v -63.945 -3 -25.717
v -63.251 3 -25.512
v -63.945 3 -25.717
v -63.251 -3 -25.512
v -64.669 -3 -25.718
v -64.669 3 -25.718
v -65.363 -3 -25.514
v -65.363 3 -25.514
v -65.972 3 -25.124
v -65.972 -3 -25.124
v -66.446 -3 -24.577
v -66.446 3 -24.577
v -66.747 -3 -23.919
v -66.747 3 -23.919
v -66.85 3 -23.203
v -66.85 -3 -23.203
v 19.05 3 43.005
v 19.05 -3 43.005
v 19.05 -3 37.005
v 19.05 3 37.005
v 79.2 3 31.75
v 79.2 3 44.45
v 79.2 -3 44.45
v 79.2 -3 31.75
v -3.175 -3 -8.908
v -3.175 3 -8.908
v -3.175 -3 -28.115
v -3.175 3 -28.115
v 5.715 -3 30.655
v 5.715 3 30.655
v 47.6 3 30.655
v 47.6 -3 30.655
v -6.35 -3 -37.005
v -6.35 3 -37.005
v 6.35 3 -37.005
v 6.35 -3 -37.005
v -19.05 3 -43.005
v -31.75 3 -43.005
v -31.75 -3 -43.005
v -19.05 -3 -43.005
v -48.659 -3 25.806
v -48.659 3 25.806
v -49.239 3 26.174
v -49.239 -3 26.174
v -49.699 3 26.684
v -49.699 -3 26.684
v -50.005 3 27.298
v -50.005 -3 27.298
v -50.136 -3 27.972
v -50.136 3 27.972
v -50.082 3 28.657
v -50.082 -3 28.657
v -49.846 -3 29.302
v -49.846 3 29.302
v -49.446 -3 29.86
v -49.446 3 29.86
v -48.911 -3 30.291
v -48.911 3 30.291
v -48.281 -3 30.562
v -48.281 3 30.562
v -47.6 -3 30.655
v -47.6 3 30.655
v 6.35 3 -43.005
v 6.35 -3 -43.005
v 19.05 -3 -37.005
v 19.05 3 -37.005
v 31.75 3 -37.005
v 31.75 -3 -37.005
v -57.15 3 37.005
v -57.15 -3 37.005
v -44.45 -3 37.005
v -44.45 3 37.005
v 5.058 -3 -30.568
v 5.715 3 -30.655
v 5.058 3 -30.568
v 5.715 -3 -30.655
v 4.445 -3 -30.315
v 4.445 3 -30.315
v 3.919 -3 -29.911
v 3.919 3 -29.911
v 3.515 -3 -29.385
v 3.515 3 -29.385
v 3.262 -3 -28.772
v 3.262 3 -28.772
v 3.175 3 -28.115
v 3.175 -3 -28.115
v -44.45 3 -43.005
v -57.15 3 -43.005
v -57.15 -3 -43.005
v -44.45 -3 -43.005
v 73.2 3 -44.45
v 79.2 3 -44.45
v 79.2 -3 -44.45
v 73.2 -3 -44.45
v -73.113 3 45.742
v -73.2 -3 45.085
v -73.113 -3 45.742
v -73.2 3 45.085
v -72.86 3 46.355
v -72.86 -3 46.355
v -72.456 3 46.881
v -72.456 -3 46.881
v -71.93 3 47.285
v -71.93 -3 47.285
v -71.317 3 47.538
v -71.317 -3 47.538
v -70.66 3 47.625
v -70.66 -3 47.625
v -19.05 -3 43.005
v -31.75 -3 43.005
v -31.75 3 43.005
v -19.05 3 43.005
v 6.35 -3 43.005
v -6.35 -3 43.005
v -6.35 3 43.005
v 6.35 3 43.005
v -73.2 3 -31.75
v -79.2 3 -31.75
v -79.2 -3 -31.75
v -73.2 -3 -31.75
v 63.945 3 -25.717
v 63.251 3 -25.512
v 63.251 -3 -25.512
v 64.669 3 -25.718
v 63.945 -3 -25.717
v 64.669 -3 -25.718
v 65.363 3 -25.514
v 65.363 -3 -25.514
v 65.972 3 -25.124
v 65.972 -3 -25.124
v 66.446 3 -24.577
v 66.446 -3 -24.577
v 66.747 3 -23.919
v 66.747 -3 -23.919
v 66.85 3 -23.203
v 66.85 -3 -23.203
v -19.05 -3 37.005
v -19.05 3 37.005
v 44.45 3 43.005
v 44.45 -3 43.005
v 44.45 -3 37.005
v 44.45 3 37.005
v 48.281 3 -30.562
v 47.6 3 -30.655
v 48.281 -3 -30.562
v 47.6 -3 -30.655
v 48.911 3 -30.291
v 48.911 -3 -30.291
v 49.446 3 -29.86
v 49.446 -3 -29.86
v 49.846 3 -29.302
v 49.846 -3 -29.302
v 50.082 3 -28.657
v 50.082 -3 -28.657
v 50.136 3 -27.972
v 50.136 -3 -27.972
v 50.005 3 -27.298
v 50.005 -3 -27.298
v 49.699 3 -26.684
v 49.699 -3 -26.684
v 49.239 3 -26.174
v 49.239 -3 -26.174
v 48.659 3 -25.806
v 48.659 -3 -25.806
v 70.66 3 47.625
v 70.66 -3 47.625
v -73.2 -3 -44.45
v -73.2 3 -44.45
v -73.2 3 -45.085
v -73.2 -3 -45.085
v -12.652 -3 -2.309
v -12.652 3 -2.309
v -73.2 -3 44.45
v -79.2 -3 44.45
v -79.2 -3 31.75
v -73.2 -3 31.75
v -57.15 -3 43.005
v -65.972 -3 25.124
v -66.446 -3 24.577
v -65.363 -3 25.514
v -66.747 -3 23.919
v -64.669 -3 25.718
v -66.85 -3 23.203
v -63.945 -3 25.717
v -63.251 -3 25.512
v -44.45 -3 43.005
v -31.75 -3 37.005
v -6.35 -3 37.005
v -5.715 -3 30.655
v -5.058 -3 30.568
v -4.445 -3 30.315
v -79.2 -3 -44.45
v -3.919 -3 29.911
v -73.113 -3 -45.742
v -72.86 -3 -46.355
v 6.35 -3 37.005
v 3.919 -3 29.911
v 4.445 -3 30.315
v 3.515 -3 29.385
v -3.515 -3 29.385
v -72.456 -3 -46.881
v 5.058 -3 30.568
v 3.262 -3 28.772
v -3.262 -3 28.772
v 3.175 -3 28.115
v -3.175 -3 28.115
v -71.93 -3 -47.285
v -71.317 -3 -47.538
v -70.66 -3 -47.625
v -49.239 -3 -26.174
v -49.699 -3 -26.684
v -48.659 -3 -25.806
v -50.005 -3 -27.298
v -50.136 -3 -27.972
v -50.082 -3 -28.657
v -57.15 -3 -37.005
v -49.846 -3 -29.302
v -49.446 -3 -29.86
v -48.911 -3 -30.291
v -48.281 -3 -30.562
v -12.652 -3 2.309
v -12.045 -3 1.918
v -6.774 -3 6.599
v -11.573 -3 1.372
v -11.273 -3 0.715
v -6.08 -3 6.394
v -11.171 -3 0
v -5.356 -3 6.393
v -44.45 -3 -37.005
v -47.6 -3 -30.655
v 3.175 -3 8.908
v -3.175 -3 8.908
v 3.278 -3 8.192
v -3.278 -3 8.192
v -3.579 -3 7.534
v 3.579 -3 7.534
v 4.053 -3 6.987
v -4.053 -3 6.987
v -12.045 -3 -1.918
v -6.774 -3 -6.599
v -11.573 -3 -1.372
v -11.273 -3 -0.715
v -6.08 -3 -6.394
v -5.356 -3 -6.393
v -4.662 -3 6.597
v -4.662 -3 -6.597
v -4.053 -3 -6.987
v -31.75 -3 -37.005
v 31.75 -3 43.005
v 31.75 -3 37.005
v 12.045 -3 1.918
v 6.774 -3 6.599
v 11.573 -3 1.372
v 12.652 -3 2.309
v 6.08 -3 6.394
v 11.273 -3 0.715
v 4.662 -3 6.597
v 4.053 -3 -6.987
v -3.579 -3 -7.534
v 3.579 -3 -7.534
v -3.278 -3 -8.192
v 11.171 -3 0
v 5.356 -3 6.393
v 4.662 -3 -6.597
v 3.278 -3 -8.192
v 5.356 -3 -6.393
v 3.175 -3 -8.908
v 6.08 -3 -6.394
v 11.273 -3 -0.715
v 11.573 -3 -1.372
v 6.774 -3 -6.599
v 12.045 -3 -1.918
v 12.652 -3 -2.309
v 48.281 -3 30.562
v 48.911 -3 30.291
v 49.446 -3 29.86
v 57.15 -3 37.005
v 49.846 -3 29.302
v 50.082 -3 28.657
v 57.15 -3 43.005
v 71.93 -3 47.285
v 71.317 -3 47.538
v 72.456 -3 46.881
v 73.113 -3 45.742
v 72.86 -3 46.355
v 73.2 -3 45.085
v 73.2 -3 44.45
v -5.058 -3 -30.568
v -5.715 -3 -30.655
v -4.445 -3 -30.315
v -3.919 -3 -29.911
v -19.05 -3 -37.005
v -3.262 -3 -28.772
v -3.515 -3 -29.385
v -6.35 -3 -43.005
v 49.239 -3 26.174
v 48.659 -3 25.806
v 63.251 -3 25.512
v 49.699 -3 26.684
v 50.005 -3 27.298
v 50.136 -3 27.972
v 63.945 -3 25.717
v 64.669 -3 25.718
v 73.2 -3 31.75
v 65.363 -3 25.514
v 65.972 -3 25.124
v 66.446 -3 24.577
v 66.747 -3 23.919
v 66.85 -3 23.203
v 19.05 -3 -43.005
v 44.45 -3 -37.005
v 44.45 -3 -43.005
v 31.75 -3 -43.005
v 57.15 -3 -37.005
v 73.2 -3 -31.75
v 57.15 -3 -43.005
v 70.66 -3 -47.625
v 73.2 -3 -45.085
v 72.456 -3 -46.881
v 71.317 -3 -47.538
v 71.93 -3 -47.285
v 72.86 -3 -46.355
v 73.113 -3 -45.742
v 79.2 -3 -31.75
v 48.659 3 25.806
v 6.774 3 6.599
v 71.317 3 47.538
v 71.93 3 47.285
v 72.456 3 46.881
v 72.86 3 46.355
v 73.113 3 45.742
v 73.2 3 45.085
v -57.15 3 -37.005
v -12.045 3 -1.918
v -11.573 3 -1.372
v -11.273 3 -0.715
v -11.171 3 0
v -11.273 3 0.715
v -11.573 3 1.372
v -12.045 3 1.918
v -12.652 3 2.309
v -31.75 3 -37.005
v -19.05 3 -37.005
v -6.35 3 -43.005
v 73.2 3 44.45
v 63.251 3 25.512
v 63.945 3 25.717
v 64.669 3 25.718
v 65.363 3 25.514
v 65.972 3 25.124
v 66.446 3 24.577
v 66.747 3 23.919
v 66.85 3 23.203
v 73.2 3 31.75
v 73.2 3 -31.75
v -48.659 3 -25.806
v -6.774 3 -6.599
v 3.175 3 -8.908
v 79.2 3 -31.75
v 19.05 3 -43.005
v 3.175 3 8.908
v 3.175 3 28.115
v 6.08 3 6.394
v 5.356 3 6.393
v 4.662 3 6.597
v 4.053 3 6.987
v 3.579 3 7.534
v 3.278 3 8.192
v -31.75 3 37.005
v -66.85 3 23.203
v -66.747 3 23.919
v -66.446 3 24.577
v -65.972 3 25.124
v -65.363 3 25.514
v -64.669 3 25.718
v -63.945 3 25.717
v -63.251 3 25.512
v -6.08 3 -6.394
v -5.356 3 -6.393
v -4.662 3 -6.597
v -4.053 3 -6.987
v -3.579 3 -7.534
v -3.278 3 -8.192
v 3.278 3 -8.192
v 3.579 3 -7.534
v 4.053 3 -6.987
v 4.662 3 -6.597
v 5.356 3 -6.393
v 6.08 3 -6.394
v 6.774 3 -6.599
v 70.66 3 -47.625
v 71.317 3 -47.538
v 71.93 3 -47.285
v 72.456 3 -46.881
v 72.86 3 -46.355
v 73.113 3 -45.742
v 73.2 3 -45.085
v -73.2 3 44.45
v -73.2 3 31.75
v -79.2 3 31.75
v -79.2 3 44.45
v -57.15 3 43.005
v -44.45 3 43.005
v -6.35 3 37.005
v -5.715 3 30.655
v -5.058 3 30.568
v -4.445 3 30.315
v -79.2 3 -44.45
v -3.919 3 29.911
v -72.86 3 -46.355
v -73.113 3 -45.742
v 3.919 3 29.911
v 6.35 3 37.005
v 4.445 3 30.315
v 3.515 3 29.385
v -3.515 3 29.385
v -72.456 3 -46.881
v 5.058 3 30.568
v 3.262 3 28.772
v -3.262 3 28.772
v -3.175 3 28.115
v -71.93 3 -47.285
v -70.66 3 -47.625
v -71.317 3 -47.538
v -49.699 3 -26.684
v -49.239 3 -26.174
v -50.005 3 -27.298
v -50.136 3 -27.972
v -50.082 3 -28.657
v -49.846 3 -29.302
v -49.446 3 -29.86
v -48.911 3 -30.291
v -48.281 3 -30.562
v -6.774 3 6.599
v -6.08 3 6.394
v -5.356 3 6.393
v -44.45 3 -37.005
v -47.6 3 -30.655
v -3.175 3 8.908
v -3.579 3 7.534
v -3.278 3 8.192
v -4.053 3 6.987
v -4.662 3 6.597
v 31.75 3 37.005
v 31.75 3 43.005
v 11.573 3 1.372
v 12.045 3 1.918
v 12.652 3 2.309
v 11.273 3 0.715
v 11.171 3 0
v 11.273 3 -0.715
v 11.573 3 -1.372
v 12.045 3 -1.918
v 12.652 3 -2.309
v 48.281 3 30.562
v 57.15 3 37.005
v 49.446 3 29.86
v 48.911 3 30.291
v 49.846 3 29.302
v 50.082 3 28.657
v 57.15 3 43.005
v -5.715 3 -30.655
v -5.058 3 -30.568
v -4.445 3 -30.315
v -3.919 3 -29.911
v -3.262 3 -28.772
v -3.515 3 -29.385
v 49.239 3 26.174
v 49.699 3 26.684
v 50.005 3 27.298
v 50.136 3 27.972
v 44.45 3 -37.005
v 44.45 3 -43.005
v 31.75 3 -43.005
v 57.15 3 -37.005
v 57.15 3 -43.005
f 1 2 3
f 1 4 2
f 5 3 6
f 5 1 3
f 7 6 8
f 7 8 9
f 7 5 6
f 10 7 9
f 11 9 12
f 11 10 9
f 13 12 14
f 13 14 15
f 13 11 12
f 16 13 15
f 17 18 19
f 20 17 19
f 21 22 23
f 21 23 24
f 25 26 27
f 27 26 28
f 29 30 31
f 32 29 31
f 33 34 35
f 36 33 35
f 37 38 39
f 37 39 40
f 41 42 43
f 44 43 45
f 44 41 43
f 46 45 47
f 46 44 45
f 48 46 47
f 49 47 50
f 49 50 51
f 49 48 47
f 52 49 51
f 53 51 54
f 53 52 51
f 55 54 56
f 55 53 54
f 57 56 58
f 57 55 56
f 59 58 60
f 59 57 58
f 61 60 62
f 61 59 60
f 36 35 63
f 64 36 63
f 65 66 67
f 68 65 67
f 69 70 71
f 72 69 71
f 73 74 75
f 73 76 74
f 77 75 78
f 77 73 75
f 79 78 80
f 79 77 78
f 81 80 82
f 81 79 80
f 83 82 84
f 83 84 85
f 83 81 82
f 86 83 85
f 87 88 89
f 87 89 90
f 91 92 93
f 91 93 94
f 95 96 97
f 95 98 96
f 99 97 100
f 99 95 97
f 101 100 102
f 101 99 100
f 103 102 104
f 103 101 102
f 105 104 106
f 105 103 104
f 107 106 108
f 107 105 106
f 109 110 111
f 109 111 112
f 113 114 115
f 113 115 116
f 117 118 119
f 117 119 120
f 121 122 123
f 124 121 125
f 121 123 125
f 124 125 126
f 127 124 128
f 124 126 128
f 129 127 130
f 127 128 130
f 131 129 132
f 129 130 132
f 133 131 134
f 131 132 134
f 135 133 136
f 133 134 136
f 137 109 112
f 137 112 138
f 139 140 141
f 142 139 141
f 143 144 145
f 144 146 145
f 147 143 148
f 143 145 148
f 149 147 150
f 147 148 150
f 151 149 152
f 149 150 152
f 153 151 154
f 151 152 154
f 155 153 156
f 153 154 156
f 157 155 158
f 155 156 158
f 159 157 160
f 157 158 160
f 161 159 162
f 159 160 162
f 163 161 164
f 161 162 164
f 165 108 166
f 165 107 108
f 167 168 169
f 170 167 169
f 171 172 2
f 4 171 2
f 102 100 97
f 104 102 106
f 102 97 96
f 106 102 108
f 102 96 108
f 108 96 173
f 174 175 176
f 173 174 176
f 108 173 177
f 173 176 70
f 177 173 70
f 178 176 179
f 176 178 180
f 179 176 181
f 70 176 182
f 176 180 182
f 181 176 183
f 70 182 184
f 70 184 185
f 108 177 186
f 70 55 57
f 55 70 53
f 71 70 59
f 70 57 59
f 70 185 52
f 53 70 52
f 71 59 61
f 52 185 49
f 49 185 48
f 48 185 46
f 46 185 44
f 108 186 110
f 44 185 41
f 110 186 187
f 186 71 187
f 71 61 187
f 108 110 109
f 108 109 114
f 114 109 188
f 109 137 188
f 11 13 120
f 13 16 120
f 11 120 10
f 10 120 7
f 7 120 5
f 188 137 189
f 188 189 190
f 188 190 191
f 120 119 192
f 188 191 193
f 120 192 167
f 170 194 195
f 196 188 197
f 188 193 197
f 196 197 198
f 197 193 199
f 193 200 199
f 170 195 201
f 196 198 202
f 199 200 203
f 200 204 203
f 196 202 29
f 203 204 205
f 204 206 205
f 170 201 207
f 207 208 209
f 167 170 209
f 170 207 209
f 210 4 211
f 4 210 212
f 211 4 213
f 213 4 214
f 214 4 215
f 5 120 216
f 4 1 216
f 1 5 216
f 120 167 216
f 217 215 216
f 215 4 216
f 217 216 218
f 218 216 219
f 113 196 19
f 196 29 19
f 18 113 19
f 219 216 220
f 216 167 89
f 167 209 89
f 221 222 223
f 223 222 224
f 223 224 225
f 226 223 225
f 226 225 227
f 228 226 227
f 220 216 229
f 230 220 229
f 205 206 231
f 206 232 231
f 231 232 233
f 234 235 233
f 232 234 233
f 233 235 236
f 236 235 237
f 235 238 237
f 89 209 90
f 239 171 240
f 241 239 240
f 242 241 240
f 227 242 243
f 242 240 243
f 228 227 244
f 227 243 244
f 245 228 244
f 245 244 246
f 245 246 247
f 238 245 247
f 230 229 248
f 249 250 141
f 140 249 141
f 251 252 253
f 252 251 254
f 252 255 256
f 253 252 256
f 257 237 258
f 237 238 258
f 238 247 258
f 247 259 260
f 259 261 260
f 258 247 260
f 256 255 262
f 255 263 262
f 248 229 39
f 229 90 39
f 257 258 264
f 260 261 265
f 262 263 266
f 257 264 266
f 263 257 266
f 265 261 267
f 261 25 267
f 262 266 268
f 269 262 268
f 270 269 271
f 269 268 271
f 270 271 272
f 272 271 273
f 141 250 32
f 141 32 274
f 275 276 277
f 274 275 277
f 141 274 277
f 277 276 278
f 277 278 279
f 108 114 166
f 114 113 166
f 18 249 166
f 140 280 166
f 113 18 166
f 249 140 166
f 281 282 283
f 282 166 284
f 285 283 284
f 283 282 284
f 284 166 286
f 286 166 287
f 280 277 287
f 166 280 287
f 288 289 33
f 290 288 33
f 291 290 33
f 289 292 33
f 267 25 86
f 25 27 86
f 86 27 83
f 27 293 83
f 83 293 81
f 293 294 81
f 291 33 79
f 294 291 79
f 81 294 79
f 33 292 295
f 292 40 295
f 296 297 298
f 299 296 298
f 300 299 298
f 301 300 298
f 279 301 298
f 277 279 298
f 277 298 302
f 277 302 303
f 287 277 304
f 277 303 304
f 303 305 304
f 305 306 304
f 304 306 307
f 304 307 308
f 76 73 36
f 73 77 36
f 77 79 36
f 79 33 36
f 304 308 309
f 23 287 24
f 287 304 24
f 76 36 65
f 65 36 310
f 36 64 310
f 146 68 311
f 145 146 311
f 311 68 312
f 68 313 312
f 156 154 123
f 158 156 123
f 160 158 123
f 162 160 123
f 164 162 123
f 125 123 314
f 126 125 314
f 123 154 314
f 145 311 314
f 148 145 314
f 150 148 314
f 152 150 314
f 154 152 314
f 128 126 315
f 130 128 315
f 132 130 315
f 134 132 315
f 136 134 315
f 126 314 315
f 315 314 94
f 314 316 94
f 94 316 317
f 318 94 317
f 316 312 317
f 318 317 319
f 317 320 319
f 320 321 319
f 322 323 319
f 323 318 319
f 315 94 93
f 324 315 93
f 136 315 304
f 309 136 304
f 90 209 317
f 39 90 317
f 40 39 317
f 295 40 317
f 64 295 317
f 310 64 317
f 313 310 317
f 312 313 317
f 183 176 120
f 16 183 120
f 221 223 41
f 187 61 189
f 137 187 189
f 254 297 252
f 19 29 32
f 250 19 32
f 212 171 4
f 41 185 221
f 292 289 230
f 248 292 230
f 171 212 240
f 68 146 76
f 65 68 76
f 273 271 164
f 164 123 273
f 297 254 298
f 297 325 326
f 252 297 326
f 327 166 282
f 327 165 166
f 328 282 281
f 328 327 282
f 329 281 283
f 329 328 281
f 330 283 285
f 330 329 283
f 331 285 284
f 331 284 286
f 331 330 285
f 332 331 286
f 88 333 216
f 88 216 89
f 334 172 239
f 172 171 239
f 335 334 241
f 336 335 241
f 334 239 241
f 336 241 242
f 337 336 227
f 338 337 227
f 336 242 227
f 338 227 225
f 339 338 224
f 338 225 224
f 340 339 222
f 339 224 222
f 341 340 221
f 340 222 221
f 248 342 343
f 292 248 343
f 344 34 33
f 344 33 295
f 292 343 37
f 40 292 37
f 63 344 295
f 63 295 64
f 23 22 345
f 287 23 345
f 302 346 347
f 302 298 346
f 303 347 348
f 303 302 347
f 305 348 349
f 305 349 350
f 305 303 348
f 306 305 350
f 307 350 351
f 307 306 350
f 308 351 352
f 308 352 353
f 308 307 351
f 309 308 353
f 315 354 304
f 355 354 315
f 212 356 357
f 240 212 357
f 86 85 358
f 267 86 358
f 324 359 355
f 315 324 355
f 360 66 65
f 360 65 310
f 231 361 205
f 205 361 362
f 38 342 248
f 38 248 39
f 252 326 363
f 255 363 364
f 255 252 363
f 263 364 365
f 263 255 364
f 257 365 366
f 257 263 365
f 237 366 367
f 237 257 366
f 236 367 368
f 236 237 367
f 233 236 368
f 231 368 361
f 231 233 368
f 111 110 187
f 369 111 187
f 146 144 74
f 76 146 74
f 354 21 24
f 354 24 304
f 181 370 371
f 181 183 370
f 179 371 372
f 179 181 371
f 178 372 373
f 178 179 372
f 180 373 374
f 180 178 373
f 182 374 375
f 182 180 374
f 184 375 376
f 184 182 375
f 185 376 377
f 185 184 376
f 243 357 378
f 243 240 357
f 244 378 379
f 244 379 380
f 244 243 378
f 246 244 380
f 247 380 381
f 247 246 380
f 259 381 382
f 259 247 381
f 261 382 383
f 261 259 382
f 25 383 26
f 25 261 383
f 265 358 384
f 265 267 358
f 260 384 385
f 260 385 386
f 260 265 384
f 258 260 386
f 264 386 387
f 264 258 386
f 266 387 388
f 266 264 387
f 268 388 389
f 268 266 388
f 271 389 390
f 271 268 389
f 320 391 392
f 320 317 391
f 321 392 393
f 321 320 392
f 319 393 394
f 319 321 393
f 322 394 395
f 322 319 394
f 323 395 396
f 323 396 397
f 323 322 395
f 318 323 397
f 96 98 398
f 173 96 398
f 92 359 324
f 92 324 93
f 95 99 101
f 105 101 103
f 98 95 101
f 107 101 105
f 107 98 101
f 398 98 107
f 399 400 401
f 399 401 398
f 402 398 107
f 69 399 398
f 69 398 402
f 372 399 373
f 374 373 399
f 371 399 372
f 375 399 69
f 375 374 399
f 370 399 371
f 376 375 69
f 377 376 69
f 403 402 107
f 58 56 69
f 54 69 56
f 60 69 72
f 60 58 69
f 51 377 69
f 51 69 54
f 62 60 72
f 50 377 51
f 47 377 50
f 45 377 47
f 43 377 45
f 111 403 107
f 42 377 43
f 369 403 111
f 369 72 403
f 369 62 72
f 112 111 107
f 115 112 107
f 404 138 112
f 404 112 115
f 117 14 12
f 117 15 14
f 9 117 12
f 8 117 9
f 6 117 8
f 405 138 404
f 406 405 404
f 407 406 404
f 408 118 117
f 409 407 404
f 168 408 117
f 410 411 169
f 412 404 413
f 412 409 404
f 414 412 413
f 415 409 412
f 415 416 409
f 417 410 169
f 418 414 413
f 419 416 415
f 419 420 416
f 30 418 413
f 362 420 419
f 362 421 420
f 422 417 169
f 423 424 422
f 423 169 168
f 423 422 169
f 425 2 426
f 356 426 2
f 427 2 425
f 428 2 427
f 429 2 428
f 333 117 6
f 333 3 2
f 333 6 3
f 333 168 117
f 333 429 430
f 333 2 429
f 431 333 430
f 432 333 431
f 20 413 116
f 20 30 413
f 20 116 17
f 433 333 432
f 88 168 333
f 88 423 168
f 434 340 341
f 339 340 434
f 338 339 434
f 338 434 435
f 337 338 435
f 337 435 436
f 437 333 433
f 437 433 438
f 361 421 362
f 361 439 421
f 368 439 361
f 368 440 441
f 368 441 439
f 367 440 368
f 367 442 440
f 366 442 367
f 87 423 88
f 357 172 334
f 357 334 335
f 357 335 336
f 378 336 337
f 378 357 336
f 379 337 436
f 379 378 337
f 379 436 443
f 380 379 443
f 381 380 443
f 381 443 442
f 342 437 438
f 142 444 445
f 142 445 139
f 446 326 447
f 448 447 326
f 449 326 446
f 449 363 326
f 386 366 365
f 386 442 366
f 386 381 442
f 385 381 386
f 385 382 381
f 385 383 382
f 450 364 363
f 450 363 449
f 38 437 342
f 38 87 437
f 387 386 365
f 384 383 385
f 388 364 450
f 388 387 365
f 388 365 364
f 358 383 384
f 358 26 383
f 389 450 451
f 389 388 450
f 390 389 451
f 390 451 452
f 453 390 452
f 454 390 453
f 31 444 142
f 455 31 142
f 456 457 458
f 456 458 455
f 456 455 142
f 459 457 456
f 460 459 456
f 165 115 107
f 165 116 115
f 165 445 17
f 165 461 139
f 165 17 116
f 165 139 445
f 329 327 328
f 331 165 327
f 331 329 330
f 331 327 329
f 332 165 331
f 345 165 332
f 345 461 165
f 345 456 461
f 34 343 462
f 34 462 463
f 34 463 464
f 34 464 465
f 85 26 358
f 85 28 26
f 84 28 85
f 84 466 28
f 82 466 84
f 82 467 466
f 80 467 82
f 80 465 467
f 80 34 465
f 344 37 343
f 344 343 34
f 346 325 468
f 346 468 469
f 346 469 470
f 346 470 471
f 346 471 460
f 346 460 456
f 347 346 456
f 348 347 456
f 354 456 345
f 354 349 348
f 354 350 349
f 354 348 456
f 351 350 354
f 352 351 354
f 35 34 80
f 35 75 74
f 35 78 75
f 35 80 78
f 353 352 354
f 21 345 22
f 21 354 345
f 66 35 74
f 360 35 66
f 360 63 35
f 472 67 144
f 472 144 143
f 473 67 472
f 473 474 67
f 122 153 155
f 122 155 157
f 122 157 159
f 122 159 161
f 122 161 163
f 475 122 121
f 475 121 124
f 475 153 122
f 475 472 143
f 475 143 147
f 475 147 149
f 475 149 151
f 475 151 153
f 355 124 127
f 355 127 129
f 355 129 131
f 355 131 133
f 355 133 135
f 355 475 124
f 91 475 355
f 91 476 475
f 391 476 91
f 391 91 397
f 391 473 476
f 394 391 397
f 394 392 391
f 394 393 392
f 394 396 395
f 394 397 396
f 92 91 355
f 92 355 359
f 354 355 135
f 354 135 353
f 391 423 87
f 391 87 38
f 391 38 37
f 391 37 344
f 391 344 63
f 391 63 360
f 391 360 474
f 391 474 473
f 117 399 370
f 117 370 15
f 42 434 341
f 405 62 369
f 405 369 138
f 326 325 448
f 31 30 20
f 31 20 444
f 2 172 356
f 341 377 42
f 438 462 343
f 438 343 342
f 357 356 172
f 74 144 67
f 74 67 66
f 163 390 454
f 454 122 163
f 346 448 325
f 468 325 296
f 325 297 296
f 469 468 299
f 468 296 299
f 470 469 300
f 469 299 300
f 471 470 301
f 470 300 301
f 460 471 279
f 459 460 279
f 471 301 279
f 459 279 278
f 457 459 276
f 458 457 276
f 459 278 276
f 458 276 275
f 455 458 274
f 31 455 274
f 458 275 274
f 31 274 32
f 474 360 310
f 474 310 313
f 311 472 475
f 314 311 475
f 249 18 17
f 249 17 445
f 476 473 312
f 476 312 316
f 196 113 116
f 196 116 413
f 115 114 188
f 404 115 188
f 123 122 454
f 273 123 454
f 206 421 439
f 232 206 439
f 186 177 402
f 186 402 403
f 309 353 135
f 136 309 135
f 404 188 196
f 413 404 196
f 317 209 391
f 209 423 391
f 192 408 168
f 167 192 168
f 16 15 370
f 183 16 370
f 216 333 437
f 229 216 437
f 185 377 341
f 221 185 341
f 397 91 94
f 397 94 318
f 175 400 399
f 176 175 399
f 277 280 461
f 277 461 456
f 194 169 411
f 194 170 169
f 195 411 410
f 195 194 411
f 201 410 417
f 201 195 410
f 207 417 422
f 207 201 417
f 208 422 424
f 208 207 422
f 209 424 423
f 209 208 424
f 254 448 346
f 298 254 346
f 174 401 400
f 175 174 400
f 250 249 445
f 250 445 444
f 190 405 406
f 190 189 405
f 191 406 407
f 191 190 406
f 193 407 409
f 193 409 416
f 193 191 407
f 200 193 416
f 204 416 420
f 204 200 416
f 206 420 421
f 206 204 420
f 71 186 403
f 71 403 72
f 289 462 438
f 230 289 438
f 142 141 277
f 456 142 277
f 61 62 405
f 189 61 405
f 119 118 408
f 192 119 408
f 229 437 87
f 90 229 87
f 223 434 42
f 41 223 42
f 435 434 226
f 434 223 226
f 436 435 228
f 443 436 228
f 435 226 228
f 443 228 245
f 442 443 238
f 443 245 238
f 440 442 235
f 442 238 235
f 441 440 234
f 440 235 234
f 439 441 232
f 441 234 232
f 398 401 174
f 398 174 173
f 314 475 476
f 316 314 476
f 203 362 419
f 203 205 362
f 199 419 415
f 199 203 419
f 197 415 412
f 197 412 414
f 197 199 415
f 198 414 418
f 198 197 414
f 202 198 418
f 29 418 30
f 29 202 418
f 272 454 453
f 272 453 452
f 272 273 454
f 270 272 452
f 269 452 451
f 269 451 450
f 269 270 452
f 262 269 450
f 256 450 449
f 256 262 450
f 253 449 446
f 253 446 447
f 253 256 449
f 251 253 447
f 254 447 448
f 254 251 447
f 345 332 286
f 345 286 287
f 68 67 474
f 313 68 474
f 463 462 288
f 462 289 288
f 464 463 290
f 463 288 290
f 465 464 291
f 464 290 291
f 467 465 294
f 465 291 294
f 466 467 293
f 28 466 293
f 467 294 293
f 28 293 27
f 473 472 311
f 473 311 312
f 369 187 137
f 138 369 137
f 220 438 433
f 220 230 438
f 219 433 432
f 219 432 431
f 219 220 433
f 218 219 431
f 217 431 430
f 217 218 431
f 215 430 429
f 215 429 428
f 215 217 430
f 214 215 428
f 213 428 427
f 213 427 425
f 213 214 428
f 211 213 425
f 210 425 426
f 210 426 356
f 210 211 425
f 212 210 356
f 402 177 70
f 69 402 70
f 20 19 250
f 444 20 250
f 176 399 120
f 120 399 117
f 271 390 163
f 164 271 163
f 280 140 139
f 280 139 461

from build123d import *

# Parameters (mm, degrees)
SKETCH1_W           = 146.4
SKETCH1_H           = 95.25
BOSS_EXTRUDE1_DEPTH = 3
SKETCH2_W           = 6
SKETCH2_H           = 12.7
BOSS_EXTRUDE2_DEPTH = 6
SKETCH3_W           = 12.7
SKETCH3_H           = 6
CUT_EXTRUDE1_DEPTH  = 93.610909859
LPATTERN3_COUNT     = 3
LPATTERN3_PITCH     = 25.4
LPATTERN3_COL_COUNT = 3
LPATTERN3_COL_PITCH = 25.4
CUT_EXTRUDE2_DEPTH  = 93.610909859
FILLET1_R           = 2.54


with BuildPart() as part:
    # Sketch1 → Boss-Extrude1 (new, symmetric)
    with BuildSketch(Plane(origin=(0, 0, 0), x_dir=(1, 0, 0), z_dir=(0, 1, 0))):
        Rectangle(SKETCH1_W, SKETCH1_H)
    extrude(amount=BOSS_EXTRUDE1_DEPTH, both=True)

    # Sketch2 → Boss-Extrude2 (add)
    with BuildSketch(Plane(origin=(0, 3, 0), x_dir=(1, 0, 0), z_dir=(0, 1, 0))):
        with Locations((-76.2, 38.1)):
            Rectangle(SKETCH2_W, SKETCH2_H)
        with Locations((-76.2, -38.1)):
            Rectangle(SKETCH2_W, SKETCH2_H)
    boss_extrude2 = extrude(amount=-BOSS_EXTRUDE2_DEPTH)

    # Mirror1: Boss-Extrude2 across plane
    add(boss_extrude2.mirror(Plane(origin=(0, 0, 0), x_dir=(0, 0, 1), z_dir=(1, 0, 0))))

    # Sketch3 → Cut-Extrude1 (cut, symmetric)
    with BuildSketch(Plane(origin=(0, 3, 0), x_dir=(1, 0, 0), z_dir=(0, 1, 0))):
        with Locations((0, -40.005)):
            Rectangle(SKETCH3_W, SKETCH3_H)
        with Locations((0, 40.005)):
            Rectangle(SKETCH3_W, SKETCH3_H)
    cut_extrude1 = extrude(amount=CUT_EXTRUDE1_DEPTH, both=True, mode=Mode.SUBTRACT)

    # LPattern3: Cut-Extrude1 ×3
    with Locations(*[(i * LPATTERN3_PITCH, 0, 0) for i in range(1, LPATTERN3_COUNT)]):
        add(cut_extrude1, mode=Mode.SUBTRACT)

    # LPattern3 col: Cut-Extrude1 ×3
    with Locations(*[(-i * LPATTERN3_COL_PITCH, 0, 0) for i in range(1, LPATTERN3_COL_COUNT)]):
        add(cut_extrude1, mode=Mode.SUBTRACT)

    # Sketch4 → Cut-Extrude2 (cut, through all)
    with BuildSketch(Plane(origin=(0, 3, 0), x_dir=(1, 0, 0), z_dir=(0, 1, 0))):
        Polygon((-3.175, 30.655), (-59.232948188, 30.655), (-3.175, 4.948845898), align=None)
        Polygon((-7.617051812, 0), (-66.85, 27.16209464), (-66.85, -27.16209464), align=None)
        Polygon((-3.175, -4.948845898), (-59.232948188, -30.655), (-3.175, -30.655), align=None)
        Polygon((59.232948188, -30.655), (3.175, -4.948845898), (3.175, -30.655), align=None)
        Polygon((66.85, 27.16209464), (7.617051812, 0), (66.85, -27.16209464), align=None)
        Polygon((59.232948188, 30.655), (3.175, 30.655), (3.175, 4.948845898), align=None)
    extrude(amount=-CUT_EXTRUDE2_DEPTH, mode=Mode.SUBTRACT)

    # Fillet1
    fillet1_edges = [part.edges().sort_by_distance(p)[0] for p in [
        (-3.175, 0, 4.948845898),
        (-3.175, 0, 30.655),
        (-59.232948188, 0, 30.655),
        (-7.617051812, 0, 0),
        (-66.85, 0, 27.16209464),
        (-66.85, 0, -27.16209464),
        (66.85, 0, -27.16209464),
        (66.85, 0, 27.16209464),
        (7.617051812, 0, 0),
        (3.175, 0, 4.948845898),
        (59.232948188, 0, 30.655),
        (3.175, 0, 30.655),
        (3.175, 0, -30.655),
        (59.232948188, 0, -30.655),
        (3.175, 0, -4.948845898),
        (-59.232948188, 0, -30.655),
        (-3.175, 0, -30.655),
        (-3.175, 0, -4.948845898),
        (-73.2, 0, -47.625),
        (73.2, 0, -47.625),
        (73.2, 0, 47.625),
        (-73.2, 0, 47.625),
    ]]
    fillet(fillet1_edges, radius=FILLET1_R)


solid = part.part
